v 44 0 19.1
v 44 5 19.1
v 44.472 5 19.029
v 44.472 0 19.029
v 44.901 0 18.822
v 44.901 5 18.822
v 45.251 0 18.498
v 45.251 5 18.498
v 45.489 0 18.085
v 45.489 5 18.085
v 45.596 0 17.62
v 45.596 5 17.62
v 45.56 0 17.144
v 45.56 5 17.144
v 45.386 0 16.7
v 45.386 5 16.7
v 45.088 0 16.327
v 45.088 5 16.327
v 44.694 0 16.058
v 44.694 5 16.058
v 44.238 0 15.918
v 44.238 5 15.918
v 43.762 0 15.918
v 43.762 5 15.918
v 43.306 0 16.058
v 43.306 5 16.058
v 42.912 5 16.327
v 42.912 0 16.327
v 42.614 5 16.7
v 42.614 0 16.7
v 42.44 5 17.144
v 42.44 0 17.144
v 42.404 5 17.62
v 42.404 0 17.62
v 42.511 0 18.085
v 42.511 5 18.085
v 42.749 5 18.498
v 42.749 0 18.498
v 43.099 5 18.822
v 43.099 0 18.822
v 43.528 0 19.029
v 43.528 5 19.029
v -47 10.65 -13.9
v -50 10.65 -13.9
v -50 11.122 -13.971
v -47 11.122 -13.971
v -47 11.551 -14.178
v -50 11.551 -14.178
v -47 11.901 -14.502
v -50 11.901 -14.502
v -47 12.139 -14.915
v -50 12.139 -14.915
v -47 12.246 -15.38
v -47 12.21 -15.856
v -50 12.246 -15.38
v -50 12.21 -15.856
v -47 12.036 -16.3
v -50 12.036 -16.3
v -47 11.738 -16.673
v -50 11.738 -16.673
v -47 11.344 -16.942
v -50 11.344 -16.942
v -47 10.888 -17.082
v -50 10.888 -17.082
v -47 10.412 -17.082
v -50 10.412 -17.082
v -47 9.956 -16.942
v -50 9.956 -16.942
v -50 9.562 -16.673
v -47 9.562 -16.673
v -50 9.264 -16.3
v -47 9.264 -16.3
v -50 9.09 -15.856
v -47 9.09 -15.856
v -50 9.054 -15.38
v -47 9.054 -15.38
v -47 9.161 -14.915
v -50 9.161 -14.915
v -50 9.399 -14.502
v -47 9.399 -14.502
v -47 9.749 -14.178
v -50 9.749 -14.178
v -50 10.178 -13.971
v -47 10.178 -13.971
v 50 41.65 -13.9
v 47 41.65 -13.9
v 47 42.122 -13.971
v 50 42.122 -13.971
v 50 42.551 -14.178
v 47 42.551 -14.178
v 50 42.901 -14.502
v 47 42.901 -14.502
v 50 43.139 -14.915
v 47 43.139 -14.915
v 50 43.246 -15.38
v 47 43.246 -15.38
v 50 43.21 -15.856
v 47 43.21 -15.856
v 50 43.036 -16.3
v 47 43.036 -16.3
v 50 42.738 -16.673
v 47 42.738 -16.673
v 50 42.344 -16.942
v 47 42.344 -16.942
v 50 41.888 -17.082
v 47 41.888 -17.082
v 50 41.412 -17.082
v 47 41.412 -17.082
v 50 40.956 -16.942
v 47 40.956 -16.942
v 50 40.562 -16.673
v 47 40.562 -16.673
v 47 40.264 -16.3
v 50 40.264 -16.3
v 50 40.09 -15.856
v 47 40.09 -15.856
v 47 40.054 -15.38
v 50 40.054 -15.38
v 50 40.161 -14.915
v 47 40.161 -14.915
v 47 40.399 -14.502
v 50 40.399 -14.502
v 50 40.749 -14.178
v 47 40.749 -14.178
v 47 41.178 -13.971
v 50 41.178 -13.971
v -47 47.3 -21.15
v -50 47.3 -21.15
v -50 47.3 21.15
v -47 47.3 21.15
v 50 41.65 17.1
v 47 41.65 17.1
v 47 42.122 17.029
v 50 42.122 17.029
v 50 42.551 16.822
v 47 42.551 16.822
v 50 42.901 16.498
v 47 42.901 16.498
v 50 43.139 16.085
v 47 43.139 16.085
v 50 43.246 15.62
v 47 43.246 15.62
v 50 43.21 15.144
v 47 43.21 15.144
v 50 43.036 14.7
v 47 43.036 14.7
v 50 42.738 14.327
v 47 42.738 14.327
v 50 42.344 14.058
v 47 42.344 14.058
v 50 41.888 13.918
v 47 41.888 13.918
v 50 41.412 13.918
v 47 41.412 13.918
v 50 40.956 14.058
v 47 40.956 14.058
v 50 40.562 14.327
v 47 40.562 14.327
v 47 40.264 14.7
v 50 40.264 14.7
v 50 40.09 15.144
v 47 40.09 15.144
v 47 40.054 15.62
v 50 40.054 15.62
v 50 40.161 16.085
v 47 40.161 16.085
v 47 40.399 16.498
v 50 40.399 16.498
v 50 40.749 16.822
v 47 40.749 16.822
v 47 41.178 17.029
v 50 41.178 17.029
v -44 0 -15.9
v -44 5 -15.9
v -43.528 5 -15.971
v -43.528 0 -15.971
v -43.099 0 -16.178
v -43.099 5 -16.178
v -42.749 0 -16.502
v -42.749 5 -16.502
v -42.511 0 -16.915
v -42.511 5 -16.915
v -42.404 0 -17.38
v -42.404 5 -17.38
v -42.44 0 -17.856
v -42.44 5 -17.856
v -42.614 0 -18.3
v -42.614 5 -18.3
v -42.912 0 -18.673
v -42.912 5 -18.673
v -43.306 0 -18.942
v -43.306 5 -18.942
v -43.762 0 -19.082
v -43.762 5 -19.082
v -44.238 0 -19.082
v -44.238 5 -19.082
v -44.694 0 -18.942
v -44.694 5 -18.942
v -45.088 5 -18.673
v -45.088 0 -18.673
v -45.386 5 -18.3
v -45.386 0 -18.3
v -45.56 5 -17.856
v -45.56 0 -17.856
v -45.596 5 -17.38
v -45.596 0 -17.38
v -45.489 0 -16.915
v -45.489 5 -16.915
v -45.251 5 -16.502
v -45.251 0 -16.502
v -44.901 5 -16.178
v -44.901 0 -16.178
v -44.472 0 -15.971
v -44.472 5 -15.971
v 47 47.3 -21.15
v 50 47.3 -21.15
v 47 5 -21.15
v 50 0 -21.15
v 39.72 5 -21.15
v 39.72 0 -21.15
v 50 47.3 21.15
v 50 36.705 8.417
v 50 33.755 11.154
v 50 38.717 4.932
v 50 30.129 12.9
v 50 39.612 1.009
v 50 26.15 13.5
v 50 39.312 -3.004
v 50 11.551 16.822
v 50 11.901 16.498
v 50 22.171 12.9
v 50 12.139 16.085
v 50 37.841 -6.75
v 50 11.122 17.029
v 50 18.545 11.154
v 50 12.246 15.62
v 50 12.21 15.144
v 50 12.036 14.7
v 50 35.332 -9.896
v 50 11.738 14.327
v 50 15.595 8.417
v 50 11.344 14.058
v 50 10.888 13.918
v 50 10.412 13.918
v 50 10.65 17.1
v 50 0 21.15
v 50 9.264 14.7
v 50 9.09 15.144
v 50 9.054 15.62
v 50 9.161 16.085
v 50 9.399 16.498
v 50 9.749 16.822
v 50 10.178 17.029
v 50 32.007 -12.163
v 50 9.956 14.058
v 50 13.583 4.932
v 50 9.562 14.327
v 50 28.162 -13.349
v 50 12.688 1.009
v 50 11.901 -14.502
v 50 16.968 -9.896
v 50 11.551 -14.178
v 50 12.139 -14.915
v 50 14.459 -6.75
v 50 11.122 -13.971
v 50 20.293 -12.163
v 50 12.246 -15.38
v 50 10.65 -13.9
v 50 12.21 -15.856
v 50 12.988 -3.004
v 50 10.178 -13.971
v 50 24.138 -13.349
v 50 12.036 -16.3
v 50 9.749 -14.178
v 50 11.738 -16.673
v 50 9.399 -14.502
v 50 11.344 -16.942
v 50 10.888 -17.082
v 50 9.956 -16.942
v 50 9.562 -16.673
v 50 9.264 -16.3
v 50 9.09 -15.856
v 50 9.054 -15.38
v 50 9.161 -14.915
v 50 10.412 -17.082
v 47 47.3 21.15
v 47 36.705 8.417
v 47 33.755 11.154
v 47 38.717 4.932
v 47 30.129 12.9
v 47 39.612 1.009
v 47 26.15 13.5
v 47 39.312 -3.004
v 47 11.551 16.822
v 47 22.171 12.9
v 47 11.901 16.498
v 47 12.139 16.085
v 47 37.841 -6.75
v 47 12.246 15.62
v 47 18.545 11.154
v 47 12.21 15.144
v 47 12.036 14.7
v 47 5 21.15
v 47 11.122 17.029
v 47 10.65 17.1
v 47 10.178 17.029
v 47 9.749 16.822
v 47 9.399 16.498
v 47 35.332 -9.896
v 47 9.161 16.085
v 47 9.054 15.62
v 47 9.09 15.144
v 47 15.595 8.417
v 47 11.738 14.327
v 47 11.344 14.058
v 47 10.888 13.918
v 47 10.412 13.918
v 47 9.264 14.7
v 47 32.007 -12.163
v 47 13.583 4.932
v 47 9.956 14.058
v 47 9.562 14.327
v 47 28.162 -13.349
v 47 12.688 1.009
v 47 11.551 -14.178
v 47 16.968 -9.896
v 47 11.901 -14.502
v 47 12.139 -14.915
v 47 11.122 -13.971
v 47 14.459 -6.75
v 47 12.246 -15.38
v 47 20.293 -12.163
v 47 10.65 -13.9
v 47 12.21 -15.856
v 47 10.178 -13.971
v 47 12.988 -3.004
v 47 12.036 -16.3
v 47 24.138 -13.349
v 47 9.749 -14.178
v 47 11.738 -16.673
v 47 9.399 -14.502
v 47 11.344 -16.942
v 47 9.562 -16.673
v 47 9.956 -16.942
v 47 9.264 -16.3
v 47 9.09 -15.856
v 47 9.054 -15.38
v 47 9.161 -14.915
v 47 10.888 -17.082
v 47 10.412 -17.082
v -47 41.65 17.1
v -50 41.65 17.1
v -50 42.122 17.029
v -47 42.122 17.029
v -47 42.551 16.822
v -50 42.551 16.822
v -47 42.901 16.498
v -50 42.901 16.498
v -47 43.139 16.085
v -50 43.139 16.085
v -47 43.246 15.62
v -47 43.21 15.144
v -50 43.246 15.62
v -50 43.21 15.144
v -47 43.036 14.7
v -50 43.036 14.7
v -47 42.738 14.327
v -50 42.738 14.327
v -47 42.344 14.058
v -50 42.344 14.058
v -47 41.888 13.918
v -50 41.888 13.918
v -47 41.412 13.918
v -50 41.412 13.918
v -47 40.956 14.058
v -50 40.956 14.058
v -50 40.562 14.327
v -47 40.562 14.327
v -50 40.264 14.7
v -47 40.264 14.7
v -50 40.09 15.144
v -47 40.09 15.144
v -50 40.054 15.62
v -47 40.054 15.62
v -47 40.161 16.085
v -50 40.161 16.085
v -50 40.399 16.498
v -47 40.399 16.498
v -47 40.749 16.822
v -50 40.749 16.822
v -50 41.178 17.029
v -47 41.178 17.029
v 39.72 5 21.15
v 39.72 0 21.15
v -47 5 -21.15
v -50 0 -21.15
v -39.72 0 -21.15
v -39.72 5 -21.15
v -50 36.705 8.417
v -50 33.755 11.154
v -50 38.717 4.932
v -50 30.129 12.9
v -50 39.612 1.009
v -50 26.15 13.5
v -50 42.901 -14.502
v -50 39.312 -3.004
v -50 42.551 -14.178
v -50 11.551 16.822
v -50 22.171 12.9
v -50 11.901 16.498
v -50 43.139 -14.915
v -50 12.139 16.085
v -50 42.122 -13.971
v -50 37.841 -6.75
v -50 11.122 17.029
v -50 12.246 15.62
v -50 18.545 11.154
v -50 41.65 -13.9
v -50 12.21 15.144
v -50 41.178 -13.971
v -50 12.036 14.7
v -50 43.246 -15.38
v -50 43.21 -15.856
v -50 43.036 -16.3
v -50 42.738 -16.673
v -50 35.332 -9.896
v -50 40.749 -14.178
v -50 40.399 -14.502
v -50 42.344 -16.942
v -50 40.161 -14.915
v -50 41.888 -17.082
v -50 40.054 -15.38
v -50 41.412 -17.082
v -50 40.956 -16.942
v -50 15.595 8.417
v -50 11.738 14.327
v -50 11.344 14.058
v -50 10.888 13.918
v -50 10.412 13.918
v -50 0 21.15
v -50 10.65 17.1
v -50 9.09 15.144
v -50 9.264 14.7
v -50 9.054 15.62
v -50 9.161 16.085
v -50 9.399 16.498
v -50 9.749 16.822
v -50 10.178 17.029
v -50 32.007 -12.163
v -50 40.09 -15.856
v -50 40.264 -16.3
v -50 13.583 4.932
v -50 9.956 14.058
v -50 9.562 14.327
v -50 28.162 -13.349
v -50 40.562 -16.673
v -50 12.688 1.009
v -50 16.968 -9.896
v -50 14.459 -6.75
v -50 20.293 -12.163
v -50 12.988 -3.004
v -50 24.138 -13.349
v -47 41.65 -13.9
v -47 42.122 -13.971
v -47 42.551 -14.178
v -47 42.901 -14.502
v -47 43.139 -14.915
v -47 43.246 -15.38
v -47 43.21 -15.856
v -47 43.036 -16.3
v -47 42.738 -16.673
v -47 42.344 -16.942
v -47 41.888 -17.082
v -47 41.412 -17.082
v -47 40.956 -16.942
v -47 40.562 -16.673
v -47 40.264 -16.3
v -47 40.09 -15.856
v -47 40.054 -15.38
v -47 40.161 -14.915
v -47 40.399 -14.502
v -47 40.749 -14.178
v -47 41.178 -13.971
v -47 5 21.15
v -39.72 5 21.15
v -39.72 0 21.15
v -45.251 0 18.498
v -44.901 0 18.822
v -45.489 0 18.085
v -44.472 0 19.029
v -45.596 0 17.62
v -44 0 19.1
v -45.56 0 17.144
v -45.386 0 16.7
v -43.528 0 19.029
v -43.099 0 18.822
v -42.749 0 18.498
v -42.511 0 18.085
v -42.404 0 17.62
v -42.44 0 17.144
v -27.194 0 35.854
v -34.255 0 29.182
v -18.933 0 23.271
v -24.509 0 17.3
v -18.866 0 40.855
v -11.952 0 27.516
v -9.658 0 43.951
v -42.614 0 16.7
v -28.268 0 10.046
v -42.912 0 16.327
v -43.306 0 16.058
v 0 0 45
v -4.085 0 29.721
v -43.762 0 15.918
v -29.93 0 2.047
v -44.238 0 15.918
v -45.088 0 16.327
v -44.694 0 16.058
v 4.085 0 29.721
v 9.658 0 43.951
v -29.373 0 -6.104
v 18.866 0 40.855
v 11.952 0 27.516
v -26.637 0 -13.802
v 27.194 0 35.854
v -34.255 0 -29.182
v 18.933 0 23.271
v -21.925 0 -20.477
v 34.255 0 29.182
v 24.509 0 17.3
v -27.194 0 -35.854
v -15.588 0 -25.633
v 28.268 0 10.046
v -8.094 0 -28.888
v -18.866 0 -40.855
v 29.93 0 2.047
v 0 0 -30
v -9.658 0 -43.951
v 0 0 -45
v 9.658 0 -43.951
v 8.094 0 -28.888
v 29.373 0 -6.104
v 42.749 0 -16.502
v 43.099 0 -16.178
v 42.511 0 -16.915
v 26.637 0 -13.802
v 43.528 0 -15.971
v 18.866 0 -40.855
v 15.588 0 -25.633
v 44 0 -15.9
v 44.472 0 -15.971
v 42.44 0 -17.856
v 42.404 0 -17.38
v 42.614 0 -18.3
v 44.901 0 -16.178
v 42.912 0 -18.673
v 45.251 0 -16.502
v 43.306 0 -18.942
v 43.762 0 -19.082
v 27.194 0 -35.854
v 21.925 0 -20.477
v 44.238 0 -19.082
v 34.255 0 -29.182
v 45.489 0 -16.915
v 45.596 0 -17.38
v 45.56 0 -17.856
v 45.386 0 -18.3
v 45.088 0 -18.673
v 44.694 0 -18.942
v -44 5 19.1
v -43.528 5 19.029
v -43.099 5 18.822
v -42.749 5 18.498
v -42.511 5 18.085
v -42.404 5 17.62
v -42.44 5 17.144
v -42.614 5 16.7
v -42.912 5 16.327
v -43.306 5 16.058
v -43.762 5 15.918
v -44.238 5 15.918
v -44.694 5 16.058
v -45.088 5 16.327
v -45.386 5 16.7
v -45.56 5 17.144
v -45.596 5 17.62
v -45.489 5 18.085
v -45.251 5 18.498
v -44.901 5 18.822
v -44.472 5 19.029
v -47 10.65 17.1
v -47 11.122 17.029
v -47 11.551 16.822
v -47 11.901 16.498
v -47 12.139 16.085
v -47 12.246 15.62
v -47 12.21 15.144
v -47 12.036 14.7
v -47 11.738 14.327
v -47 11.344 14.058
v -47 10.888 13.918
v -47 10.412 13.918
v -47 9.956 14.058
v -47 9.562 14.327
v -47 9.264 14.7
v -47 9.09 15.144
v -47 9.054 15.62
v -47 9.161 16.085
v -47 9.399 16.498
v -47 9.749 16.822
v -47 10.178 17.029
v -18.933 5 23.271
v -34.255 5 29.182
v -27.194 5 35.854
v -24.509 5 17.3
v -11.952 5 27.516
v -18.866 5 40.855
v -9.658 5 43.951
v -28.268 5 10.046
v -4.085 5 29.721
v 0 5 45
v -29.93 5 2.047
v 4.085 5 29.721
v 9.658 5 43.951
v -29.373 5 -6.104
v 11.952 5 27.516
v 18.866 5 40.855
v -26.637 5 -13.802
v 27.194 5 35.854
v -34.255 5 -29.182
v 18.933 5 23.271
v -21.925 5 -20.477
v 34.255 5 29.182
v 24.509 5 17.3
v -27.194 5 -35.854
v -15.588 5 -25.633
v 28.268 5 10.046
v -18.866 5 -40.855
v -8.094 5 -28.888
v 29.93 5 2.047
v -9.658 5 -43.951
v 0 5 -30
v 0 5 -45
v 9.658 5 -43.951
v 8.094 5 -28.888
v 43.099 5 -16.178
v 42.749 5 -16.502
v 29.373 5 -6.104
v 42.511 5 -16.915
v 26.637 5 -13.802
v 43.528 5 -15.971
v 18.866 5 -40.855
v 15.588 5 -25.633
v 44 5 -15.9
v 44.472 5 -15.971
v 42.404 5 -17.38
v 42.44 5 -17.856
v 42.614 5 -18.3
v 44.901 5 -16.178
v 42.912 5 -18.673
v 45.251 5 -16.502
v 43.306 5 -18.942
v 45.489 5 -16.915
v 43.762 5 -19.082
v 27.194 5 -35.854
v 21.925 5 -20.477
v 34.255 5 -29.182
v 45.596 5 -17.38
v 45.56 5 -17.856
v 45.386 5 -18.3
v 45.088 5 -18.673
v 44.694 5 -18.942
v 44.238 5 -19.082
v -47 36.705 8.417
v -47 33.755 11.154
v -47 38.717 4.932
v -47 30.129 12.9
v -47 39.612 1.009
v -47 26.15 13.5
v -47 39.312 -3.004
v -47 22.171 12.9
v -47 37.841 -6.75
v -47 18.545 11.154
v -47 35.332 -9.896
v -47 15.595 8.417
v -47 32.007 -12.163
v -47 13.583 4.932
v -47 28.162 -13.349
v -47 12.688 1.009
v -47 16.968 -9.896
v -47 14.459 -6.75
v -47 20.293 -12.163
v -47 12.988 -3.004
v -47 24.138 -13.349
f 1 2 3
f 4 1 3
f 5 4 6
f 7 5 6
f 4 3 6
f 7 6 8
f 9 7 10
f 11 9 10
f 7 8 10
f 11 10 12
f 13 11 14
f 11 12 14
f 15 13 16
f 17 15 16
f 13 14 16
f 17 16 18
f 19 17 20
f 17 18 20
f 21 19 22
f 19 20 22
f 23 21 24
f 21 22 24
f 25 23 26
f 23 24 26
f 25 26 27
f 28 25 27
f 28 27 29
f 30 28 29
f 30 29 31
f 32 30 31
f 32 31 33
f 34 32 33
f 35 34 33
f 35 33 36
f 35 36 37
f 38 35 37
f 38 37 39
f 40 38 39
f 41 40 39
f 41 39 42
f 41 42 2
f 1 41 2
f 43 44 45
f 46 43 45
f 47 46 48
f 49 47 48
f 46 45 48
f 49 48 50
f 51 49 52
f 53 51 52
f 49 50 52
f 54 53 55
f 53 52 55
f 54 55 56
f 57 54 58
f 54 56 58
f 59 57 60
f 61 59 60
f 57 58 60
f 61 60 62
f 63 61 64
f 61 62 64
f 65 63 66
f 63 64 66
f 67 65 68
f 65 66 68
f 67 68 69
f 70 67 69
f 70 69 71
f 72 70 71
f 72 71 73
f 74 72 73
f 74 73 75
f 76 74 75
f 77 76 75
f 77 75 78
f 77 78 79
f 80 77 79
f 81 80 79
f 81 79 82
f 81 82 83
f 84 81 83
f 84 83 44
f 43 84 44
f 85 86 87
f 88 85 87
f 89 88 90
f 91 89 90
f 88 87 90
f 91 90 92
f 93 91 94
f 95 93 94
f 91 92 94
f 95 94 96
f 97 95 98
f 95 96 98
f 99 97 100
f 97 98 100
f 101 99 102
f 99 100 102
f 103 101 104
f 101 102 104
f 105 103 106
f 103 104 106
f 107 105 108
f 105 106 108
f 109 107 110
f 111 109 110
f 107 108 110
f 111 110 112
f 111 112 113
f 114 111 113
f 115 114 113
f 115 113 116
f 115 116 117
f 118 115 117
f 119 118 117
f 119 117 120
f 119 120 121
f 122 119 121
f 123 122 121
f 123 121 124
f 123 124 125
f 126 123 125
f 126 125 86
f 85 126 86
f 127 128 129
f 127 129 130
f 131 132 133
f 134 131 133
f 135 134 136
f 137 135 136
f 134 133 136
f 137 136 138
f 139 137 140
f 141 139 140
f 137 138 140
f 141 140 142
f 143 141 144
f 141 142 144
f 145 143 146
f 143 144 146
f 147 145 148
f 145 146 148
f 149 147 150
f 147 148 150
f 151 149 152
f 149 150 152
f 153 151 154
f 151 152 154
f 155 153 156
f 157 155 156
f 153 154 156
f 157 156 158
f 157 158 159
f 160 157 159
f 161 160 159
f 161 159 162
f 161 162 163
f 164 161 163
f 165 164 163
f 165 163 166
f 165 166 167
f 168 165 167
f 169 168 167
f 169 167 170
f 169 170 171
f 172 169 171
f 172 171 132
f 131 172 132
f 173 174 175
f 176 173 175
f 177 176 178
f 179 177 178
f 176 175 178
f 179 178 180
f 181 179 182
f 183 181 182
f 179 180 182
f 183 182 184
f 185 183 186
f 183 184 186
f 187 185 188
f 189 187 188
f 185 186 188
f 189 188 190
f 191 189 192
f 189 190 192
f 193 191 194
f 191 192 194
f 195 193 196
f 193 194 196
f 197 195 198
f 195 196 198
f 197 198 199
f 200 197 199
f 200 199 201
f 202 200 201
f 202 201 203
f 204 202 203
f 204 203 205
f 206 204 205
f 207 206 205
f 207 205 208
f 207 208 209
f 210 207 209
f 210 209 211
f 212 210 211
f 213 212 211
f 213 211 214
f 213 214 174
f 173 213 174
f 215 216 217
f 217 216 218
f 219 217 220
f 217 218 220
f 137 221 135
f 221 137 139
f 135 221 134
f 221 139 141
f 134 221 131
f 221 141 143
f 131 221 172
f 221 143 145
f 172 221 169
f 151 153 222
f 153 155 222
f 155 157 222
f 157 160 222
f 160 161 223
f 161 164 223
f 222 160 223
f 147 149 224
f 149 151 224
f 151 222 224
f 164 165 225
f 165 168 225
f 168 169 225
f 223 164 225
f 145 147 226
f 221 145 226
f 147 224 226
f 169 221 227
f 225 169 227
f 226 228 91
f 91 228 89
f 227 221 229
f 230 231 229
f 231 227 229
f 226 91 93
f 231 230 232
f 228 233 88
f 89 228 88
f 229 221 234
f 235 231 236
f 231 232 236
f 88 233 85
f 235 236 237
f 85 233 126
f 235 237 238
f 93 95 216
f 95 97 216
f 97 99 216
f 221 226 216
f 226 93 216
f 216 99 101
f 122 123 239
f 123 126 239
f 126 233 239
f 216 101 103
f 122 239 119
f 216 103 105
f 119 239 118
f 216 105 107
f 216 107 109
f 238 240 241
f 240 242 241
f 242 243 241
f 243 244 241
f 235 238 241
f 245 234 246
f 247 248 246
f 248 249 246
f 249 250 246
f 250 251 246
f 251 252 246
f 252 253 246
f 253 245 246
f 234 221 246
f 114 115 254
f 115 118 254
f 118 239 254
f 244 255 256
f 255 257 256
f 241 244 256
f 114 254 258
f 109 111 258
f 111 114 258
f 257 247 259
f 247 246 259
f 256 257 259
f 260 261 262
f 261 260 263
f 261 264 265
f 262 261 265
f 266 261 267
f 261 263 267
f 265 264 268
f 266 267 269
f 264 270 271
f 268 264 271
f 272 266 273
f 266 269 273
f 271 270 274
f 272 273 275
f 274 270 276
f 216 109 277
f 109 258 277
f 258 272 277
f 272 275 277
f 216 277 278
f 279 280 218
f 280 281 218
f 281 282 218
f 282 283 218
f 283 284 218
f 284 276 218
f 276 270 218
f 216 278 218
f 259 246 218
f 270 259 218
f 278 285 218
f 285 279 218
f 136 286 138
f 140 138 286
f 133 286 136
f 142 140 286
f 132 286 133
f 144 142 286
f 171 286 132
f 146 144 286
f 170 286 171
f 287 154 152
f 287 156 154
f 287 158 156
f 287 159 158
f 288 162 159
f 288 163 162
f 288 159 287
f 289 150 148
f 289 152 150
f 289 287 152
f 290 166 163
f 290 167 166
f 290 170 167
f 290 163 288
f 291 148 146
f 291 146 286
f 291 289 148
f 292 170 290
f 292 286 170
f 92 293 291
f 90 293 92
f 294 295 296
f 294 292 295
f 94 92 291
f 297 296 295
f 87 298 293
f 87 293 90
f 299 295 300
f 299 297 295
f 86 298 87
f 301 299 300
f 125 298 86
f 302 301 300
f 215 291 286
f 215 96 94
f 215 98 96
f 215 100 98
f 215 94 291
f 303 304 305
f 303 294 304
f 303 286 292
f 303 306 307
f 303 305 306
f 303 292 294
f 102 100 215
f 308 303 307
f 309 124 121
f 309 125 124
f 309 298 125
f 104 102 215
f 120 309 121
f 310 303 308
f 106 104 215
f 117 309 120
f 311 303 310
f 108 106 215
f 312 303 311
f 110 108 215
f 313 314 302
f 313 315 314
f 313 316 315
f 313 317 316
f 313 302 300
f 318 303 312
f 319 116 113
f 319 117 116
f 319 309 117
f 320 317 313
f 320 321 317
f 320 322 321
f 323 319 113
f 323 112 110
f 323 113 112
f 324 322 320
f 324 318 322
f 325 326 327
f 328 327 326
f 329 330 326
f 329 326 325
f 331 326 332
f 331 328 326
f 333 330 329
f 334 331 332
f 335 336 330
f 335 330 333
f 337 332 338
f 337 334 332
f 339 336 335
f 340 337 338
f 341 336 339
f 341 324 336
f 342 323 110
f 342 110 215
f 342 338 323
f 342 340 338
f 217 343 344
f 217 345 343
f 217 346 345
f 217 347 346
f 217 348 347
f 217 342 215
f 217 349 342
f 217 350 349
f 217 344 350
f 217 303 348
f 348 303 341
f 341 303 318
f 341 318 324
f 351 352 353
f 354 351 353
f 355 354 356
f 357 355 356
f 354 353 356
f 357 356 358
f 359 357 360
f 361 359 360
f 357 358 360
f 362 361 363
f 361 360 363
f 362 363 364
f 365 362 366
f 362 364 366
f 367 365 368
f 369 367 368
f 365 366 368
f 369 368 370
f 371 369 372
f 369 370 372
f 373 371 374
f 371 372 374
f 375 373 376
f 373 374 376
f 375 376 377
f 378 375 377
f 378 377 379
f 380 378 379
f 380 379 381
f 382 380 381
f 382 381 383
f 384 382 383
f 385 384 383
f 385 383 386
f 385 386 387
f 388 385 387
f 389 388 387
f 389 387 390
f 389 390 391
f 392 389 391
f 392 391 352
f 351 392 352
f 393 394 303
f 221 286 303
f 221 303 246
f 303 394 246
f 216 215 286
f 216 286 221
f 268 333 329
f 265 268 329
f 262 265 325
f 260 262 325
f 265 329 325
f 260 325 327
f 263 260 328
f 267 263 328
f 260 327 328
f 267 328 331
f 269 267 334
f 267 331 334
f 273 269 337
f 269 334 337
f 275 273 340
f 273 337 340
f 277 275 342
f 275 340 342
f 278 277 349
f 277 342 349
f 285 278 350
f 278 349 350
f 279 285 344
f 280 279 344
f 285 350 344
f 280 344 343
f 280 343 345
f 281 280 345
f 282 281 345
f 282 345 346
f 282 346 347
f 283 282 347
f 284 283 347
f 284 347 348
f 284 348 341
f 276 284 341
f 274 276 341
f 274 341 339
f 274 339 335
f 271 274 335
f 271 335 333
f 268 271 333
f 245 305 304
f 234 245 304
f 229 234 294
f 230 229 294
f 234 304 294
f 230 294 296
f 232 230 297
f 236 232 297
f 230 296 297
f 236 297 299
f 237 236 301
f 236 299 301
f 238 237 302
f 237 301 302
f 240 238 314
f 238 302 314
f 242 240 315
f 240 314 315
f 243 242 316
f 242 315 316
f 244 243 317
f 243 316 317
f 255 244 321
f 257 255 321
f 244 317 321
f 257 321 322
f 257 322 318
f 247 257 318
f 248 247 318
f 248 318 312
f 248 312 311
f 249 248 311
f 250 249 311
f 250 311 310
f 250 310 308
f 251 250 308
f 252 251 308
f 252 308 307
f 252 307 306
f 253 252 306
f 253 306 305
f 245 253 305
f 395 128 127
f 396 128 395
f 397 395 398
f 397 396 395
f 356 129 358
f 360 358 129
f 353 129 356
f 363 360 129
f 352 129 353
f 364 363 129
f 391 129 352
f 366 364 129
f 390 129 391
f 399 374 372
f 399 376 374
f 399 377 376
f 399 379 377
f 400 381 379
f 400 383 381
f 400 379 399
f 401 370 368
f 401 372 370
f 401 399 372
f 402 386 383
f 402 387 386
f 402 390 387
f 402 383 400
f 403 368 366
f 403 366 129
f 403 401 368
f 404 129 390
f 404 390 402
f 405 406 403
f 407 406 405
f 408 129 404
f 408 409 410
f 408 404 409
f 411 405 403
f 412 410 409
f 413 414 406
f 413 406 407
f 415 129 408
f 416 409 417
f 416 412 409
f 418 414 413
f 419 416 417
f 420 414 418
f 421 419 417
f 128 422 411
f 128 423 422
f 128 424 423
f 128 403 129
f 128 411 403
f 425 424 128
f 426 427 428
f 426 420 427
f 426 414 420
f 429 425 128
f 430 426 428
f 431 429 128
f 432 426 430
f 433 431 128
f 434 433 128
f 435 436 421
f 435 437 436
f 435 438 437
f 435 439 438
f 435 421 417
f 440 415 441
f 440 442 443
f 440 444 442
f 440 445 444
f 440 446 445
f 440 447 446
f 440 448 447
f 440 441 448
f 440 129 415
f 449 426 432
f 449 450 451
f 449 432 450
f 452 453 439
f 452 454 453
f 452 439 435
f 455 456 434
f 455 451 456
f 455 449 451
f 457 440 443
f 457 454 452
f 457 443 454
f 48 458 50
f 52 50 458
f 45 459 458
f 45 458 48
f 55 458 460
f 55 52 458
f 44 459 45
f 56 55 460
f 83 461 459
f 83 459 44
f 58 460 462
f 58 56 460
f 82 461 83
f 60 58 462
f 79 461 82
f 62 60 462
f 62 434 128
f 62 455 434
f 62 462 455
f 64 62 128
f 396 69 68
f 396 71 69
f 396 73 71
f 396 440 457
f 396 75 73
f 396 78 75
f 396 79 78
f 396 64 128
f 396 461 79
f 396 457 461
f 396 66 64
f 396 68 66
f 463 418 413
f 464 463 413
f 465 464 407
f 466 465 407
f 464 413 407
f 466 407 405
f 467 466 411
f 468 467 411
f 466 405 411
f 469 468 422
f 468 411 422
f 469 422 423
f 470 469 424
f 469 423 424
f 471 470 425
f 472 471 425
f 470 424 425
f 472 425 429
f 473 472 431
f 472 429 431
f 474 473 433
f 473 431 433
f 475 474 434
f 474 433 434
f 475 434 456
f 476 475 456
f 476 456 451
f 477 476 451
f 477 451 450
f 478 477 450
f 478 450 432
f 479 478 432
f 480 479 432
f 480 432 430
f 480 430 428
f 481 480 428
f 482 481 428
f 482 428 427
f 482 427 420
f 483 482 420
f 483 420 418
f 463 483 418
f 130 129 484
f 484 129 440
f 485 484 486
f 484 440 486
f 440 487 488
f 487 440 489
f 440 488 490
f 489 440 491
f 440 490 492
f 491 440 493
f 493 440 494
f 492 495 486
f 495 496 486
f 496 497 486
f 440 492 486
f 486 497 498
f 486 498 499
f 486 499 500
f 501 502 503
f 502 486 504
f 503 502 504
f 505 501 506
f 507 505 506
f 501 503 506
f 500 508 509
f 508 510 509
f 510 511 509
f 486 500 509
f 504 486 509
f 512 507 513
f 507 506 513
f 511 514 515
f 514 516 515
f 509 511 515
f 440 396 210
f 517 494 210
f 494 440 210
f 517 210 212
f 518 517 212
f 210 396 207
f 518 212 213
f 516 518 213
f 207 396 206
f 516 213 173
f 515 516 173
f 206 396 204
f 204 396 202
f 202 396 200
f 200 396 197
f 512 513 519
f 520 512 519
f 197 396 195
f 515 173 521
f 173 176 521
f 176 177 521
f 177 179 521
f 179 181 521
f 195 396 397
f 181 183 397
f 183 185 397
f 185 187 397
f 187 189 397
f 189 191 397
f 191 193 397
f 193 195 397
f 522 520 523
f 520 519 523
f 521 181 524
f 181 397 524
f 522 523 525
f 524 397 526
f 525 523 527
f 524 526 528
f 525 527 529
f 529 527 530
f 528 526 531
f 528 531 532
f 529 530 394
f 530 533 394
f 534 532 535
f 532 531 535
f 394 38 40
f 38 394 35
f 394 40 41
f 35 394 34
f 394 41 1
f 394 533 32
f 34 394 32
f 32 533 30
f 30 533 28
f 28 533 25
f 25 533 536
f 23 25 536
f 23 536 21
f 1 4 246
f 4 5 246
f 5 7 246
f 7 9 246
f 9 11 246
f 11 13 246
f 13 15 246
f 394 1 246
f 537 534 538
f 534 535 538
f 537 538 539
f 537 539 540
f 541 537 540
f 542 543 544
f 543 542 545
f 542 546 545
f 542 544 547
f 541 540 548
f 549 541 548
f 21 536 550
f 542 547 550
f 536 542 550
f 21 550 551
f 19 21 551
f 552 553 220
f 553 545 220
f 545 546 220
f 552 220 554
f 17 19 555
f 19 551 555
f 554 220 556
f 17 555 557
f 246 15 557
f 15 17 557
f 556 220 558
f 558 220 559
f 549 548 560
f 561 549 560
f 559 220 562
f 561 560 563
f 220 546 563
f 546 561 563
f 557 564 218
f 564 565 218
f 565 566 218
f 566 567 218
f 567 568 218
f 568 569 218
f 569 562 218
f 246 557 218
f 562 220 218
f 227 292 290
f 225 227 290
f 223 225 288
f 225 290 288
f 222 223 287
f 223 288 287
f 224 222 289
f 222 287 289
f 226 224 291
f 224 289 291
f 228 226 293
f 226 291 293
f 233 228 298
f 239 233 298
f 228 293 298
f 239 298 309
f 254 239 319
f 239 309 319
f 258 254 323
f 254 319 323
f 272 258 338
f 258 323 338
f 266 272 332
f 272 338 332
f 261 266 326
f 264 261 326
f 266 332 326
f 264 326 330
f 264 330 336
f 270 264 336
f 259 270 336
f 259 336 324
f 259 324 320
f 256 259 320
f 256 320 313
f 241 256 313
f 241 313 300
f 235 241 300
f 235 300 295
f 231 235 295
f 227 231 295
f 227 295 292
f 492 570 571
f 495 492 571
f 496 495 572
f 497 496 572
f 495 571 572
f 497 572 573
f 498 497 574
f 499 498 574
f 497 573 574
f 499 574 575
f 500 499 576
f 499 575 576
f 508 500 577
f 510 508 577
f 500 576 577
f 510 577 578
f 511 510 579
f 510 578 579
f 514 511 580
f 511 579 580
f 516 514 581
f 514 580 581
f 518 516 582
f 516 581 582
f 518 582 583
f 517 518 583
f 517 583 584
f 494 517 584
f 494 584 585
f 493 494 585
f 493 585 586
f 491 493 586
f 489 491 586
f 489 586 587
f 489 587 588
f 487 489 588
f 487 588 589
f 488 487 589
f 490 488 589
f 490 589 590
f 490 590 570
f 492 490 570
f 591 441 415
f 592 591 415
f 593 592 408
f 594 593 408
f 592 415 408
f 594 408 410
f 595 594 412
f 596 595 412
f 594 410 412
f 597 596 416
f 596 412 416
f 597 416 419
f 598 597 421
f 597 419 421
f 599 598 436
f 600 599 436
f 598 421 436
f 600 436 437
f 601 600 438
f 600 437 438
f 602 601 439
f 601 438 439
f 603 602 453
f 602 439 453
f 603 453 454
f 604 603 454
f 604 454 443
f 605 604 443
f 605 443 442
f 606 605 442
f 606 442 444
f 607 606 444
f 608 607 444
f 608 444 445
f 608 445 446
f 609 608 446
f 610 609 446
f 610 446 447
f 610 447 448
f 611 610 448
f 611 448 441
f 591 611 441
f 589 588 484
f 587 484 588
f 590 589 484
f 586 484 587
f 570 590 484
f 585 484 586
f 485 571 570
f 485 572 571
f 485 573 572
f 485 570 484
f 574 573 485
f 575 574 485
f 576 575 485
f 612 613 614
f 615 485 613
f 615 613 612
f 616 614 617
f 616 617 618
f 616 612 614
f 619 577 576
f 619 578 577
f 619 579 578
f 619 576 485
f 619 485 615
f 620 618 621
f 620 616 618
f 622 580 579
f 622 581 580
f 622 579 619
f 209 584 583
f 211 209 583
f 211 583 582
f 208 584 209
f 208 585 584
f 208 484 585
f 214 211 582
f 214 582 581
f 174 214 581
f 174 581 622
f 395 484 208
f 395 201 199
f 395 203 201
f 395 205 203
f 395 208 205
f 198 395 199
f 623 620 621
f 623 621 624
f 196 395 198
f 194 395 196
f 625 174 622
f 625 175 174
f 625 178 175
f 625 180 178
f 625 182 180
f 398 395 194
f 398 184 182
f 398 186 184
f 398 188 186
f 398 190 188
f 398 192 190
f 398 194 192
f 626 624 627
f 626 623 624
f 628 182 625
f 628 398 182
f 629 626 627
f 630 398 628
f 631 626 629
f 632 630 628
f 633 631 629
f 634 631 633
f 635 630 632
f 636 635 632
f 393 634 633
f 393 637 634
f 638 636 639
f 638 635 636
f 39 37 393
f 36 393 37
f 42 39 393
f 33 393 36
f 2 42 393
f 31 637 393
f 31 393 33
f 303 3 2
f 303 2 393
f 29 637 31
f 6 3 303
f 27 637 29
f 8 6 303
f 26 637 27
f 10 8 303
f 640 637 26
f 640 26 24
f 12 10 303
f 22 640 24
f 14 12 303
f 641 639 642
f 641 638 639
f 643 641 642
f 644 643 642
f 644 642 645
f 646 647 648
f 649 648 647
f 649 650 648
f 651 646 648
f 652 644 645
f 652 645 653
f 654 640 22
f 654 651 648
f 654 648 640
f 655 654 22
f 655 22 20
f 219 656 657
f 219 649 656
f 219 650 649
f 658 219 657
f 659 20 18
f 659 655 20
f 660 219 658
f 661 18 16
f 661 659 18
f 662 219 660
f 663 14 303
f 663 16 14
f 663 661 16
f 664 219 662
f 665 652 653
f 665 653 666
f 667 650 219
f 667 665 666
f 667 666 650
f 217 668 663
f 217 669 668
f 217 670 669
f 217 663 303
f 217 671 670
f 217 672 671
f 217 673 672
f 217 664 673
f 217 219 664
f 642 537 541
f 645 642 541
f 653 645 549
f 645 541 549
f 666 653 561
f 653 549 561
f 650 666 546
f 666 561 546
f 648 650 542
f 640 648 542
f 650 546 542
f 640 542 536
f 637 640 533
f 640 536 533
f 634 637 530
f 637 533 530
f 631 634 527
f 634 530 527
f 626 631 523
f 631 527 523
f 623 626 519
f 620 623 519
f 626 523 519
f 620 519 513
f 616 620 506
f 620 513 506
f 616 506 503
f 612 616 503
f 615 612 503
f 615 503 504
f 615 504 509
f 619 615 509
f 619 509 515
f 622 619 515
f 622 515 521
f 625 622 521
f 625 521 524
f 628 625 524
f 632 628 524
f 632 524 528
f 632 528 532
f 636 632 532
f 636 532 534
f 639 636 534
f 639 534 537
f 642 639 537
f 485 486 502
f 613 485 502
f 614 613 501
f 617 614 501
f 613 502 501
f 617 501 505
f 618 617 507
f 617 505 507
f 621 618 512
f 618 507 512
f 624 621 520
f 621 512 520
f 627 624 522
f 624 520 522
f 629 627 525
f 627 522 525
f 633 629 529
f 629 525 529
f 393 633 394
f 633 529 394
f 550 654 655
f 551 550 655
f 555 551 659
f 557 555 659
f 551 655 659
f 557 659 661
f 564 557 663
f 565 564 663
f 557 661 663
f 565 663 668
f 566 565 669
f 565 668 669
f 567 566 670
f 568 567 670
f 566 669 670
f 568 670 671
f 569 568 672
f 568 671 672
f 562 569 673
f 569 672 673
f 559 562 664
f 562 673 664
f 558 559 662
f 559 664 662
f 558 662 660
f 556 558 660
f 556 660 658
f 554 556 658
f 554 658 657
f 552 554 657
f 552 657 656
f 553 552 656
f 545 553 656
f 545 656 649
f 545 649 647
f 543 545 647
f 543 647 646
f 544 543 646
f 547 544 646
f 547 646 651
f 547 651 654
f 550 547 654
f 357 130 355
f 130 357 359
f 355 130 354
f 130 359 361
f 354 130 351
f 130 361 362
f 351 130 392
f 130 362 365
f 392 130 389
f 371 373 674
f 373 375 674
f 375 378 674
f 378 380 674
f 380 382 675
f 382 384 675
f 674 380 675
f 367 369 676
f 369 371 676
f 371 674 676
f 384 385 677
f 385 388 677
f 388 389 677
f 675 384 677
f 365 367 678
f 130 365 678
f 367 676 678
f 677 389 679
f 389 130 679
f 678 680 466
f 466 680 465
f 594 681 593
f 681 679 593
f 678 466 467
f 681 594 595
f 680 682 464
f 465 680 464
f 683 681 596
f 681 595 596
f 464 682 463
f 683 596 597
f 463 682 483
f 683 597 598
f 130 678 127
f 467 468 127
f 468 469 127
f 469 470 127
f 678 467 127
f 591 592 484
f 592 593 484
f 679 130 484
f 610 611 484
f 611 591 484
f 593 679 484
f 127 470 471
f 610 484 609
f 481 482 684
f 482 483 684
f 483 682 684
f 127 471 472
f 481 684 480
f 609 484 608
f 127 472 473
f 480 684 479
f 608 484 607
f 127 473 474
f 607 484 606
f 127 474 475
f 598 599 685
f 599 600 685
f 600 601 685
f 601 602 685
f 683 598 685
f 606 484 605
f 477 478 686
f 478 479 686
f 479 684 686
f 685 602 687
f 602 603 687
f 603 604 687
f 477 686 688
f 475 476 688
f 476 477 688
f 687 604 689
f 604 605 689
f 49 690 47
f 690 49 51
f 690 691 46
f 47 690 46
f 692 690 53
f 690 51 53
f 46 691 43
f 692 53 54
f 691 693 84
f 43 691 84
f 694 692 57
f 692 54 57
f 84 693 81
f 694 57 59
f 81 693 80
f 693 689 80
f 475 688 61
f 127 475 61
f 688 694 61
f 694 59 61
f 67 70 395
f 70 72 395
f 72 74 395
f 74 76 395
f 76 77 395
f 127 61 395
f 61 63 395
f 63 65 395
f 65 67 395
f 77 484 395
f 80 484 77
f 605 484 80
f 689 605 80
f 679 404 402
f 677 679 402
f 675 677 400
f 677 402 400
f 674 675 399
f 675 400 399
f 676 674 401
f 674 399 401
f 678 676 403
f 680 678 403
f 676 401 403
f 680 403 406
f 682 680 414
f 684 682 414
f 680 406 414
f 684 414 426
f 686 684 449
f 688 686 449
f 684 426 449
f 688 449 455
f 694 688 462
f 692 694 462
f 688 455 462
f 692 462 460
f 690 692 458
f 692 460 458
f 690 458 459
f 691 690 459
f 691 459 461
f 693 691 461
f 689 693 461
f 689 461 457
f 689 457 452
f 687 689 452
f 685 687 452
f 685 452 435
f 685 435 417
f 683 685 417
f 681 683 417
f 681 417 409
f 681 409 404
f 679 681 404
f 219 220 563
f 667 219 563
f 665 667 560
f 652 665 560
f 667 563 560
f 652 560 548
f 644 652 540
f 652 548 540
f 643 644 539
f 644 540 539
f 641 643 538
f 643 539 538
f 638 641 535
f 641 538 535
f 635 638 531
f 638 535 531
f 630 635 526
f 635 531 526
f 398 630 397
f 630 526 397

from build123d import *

# Parameters (mm, degrees)
BODY_DEPTH                = 5
SKETCH4_W                 = 3
SKETCH4_H                 = 42.3
EXTRUDE_WING_DEPTH        = 42.3
SKETCH5_R                 = 1.6
SKETCH5_R_2               = 13.5
CUT_MOTOR_HOLES_DEPTH     = 120.424829914
CUT_EXCESS_MATERIAL_REACH = 84.233
SKETCH8_R                 = 30
CUT_DECK_HOLES_REACH      = 81.463
SKETCH9_R                 = 1.6


with BuildPart() as part:
    # Sketch1 → body (new body)
    with BuildSketch(Plane(origin=(0, 0, 0), x_dir=(1, 0, 0), z_dir=(0, 1, 0))):
        with BuildLine():
            Line((-39.719988671, 21.15), (-50, 21.15))
            Line((-50, 21.15), (-50, -21.15))
            Line((-50, -21.15), (-39.719988671, -21.15))
            ThreePointArc((-39.719988671, -21.15), (0, -45), (39.719988671, -21.15))
            Line((39.719988671, -21.15), (50, -21.15))
            Line((50, -21.15), (50, 21.15))
            Line((50, 21.15), (39.719988671, 21.15))
            ThreePointArc((39.719988671, 21.15), (0, 45), (-39.719988671, 21.15))
        make_face()
    extrude(amount=BODY_DEPTH)

    # Sketch4 → extrude-wing (add)
    with BuildSketch(Plane(origin=(0, 5, 0), x_dir=(1, 0, 0), z_dir=(0, 1, 0))):
        with Locations((-48.5, 0)):
            Rectangle(SKETCH4_W, SKETCH4_H)
        with Locations((48.5, 0)):
            Rectangle(SKETCH4_W, SKETCH4_H)
    extrude(amount=EXTRUDE_WING_DEPTH)

    # Sketch5 → cut-motor-holes (cut, through all)
    with BuildSketch(Plane.ZY.offset(50)):
        with Locations((-15.5, 41.65)):
            Circle(SKETCH5_R)
        with Locations((15.5, 41.65)):
            Circle(SKETCH5_R)
        with Locations((15.5, 10.65)):
            Circle(SKETCH5_R)
        with Locations((-15.5, 10.65)):
            Circle(SKETCH5_R)
        with Locations((0, 26.15)):
            Circle(SKETCH5_R_2)
    extrude(amount=-CUT_MOTOR_HOLES_DEPTH, mode=Mode.SUBTRACT)

    # Sketch8 → cut-excess-material (cut, up to next)
    with BuildSketch(Plane.XZ, mode=Mode.PRIVATE) as cut_excess_material_sk1:
        with Locations(Location((0, 0, 0), (0, 0, 270))):
            Circle(SKETCH8_R)
    cut_excess_material_tool1 = extrude(cut_excess_material_sk1.sketch, amount=-CUT_EXCESS_MATERIAL_REACH, mode=Mode.PRIVATE) & part.part
    add(cut_excess_material_tool1.solids().sort_by_distance((0, 0, 0))[0], mode=Mode.SUBTRACT)

    # Sketch9 → cut-deck-holes (cut, up to next)
    with BuildSketch(Plane(origin=(0, 5, 0), x_dir=(1, 0, 0), z_dir=(0, 1, 0)), mode=Mode.PRIVATE) as cut_deck_holes_sk1:
        with Locations(Location((44, -17.5, 0), (0, 0, 270))):
            Circle(SKETCH9_R)
    cut_deck_holes_tool1 = extrude(cut_deck_holes_sk1.sketch, amount=-CUT_DECK_HOLES_REACH, mode=Mode.PRIVATE) & part.part
    # Sketch9 → cut-deck-holes (cut, up to next)
    with BuildSketch(Plane(origin=(0, 5, 0), x_dir=(1, 0, 0), z_dir=(0, 1, 0)), mode=Mode.PRIVATE) as cut_deck_holes_sk2:
        with Locations(Location((44, 17.5, 0), (0, 0, 270))):
            Circle(SKETCH9_R)
    cut_deck_holes_tool2 = extrude(cut_deck_holes_sk2.sketch, amount=-CUT_DECK_HOLES_REACH, mode=Mode.PRIVATE) & part.part
    # Sketch9 → cut-deck-holes (cut, up to next)
    with BuildSketch(Plane(origin=(0, 5, 0), x_dir=(1, 0, 0), z_dir=(0, 1, 0)), mode=Mode.PRIVATE) as cut_deck_holes_sk3:
        with Locations(Location((-44, 17.5, 0), (0, 0, 270))):
            Circle(SKETCH9_R)
    cut_deck_holes_tool3 = extrude(cut_deck_holes_sk3.sketch, amount=-CUT_DECK_HOLES_REACH, mode=Mode.PRIVATE) & part.part
    # Sketch9 → cut-deck-holes (cut, up to next)
    with BuildSketch(Plane(origin=(0, 5, 0), x_dir=(1, 0, 0), z_dir=(0, 1, 0)), mode=Mode.PRIVATE) as cut_deck_holes_sk4:
        with Locations(Location((-44, -17.5, 0), (0, 0, 270))):
            Circle(SKETCH9_R)
    cut_deck_holes_tool4 = extrude(cut_deck_holes_sk4.sketch, amount=-CUT_DECK_HOLES_REACH, mode=Mode.PRIVATE) & part.part
    add(cut_deck_holes_tool1.solids().sort_by_distance((44, 5, 17.5))[0], mode=Mode.SUBTRACT)
    add(cut_deck_holes_tool2.solids().sort_by_distance((44, 5, -17.5))[0], mode=Mode.SUBTRACT)
    add(cut_deck_holes_tool3.solids().sort_by_distance((-44, 5, -17.5))[0], mode=Mode.SUBTRACT)
    add(cut_deck_holes_tool4.solids().sort_by_distance((-44, 5, 17.5))[0], mode=Mode.SUBTRACT)


solid = part.part
